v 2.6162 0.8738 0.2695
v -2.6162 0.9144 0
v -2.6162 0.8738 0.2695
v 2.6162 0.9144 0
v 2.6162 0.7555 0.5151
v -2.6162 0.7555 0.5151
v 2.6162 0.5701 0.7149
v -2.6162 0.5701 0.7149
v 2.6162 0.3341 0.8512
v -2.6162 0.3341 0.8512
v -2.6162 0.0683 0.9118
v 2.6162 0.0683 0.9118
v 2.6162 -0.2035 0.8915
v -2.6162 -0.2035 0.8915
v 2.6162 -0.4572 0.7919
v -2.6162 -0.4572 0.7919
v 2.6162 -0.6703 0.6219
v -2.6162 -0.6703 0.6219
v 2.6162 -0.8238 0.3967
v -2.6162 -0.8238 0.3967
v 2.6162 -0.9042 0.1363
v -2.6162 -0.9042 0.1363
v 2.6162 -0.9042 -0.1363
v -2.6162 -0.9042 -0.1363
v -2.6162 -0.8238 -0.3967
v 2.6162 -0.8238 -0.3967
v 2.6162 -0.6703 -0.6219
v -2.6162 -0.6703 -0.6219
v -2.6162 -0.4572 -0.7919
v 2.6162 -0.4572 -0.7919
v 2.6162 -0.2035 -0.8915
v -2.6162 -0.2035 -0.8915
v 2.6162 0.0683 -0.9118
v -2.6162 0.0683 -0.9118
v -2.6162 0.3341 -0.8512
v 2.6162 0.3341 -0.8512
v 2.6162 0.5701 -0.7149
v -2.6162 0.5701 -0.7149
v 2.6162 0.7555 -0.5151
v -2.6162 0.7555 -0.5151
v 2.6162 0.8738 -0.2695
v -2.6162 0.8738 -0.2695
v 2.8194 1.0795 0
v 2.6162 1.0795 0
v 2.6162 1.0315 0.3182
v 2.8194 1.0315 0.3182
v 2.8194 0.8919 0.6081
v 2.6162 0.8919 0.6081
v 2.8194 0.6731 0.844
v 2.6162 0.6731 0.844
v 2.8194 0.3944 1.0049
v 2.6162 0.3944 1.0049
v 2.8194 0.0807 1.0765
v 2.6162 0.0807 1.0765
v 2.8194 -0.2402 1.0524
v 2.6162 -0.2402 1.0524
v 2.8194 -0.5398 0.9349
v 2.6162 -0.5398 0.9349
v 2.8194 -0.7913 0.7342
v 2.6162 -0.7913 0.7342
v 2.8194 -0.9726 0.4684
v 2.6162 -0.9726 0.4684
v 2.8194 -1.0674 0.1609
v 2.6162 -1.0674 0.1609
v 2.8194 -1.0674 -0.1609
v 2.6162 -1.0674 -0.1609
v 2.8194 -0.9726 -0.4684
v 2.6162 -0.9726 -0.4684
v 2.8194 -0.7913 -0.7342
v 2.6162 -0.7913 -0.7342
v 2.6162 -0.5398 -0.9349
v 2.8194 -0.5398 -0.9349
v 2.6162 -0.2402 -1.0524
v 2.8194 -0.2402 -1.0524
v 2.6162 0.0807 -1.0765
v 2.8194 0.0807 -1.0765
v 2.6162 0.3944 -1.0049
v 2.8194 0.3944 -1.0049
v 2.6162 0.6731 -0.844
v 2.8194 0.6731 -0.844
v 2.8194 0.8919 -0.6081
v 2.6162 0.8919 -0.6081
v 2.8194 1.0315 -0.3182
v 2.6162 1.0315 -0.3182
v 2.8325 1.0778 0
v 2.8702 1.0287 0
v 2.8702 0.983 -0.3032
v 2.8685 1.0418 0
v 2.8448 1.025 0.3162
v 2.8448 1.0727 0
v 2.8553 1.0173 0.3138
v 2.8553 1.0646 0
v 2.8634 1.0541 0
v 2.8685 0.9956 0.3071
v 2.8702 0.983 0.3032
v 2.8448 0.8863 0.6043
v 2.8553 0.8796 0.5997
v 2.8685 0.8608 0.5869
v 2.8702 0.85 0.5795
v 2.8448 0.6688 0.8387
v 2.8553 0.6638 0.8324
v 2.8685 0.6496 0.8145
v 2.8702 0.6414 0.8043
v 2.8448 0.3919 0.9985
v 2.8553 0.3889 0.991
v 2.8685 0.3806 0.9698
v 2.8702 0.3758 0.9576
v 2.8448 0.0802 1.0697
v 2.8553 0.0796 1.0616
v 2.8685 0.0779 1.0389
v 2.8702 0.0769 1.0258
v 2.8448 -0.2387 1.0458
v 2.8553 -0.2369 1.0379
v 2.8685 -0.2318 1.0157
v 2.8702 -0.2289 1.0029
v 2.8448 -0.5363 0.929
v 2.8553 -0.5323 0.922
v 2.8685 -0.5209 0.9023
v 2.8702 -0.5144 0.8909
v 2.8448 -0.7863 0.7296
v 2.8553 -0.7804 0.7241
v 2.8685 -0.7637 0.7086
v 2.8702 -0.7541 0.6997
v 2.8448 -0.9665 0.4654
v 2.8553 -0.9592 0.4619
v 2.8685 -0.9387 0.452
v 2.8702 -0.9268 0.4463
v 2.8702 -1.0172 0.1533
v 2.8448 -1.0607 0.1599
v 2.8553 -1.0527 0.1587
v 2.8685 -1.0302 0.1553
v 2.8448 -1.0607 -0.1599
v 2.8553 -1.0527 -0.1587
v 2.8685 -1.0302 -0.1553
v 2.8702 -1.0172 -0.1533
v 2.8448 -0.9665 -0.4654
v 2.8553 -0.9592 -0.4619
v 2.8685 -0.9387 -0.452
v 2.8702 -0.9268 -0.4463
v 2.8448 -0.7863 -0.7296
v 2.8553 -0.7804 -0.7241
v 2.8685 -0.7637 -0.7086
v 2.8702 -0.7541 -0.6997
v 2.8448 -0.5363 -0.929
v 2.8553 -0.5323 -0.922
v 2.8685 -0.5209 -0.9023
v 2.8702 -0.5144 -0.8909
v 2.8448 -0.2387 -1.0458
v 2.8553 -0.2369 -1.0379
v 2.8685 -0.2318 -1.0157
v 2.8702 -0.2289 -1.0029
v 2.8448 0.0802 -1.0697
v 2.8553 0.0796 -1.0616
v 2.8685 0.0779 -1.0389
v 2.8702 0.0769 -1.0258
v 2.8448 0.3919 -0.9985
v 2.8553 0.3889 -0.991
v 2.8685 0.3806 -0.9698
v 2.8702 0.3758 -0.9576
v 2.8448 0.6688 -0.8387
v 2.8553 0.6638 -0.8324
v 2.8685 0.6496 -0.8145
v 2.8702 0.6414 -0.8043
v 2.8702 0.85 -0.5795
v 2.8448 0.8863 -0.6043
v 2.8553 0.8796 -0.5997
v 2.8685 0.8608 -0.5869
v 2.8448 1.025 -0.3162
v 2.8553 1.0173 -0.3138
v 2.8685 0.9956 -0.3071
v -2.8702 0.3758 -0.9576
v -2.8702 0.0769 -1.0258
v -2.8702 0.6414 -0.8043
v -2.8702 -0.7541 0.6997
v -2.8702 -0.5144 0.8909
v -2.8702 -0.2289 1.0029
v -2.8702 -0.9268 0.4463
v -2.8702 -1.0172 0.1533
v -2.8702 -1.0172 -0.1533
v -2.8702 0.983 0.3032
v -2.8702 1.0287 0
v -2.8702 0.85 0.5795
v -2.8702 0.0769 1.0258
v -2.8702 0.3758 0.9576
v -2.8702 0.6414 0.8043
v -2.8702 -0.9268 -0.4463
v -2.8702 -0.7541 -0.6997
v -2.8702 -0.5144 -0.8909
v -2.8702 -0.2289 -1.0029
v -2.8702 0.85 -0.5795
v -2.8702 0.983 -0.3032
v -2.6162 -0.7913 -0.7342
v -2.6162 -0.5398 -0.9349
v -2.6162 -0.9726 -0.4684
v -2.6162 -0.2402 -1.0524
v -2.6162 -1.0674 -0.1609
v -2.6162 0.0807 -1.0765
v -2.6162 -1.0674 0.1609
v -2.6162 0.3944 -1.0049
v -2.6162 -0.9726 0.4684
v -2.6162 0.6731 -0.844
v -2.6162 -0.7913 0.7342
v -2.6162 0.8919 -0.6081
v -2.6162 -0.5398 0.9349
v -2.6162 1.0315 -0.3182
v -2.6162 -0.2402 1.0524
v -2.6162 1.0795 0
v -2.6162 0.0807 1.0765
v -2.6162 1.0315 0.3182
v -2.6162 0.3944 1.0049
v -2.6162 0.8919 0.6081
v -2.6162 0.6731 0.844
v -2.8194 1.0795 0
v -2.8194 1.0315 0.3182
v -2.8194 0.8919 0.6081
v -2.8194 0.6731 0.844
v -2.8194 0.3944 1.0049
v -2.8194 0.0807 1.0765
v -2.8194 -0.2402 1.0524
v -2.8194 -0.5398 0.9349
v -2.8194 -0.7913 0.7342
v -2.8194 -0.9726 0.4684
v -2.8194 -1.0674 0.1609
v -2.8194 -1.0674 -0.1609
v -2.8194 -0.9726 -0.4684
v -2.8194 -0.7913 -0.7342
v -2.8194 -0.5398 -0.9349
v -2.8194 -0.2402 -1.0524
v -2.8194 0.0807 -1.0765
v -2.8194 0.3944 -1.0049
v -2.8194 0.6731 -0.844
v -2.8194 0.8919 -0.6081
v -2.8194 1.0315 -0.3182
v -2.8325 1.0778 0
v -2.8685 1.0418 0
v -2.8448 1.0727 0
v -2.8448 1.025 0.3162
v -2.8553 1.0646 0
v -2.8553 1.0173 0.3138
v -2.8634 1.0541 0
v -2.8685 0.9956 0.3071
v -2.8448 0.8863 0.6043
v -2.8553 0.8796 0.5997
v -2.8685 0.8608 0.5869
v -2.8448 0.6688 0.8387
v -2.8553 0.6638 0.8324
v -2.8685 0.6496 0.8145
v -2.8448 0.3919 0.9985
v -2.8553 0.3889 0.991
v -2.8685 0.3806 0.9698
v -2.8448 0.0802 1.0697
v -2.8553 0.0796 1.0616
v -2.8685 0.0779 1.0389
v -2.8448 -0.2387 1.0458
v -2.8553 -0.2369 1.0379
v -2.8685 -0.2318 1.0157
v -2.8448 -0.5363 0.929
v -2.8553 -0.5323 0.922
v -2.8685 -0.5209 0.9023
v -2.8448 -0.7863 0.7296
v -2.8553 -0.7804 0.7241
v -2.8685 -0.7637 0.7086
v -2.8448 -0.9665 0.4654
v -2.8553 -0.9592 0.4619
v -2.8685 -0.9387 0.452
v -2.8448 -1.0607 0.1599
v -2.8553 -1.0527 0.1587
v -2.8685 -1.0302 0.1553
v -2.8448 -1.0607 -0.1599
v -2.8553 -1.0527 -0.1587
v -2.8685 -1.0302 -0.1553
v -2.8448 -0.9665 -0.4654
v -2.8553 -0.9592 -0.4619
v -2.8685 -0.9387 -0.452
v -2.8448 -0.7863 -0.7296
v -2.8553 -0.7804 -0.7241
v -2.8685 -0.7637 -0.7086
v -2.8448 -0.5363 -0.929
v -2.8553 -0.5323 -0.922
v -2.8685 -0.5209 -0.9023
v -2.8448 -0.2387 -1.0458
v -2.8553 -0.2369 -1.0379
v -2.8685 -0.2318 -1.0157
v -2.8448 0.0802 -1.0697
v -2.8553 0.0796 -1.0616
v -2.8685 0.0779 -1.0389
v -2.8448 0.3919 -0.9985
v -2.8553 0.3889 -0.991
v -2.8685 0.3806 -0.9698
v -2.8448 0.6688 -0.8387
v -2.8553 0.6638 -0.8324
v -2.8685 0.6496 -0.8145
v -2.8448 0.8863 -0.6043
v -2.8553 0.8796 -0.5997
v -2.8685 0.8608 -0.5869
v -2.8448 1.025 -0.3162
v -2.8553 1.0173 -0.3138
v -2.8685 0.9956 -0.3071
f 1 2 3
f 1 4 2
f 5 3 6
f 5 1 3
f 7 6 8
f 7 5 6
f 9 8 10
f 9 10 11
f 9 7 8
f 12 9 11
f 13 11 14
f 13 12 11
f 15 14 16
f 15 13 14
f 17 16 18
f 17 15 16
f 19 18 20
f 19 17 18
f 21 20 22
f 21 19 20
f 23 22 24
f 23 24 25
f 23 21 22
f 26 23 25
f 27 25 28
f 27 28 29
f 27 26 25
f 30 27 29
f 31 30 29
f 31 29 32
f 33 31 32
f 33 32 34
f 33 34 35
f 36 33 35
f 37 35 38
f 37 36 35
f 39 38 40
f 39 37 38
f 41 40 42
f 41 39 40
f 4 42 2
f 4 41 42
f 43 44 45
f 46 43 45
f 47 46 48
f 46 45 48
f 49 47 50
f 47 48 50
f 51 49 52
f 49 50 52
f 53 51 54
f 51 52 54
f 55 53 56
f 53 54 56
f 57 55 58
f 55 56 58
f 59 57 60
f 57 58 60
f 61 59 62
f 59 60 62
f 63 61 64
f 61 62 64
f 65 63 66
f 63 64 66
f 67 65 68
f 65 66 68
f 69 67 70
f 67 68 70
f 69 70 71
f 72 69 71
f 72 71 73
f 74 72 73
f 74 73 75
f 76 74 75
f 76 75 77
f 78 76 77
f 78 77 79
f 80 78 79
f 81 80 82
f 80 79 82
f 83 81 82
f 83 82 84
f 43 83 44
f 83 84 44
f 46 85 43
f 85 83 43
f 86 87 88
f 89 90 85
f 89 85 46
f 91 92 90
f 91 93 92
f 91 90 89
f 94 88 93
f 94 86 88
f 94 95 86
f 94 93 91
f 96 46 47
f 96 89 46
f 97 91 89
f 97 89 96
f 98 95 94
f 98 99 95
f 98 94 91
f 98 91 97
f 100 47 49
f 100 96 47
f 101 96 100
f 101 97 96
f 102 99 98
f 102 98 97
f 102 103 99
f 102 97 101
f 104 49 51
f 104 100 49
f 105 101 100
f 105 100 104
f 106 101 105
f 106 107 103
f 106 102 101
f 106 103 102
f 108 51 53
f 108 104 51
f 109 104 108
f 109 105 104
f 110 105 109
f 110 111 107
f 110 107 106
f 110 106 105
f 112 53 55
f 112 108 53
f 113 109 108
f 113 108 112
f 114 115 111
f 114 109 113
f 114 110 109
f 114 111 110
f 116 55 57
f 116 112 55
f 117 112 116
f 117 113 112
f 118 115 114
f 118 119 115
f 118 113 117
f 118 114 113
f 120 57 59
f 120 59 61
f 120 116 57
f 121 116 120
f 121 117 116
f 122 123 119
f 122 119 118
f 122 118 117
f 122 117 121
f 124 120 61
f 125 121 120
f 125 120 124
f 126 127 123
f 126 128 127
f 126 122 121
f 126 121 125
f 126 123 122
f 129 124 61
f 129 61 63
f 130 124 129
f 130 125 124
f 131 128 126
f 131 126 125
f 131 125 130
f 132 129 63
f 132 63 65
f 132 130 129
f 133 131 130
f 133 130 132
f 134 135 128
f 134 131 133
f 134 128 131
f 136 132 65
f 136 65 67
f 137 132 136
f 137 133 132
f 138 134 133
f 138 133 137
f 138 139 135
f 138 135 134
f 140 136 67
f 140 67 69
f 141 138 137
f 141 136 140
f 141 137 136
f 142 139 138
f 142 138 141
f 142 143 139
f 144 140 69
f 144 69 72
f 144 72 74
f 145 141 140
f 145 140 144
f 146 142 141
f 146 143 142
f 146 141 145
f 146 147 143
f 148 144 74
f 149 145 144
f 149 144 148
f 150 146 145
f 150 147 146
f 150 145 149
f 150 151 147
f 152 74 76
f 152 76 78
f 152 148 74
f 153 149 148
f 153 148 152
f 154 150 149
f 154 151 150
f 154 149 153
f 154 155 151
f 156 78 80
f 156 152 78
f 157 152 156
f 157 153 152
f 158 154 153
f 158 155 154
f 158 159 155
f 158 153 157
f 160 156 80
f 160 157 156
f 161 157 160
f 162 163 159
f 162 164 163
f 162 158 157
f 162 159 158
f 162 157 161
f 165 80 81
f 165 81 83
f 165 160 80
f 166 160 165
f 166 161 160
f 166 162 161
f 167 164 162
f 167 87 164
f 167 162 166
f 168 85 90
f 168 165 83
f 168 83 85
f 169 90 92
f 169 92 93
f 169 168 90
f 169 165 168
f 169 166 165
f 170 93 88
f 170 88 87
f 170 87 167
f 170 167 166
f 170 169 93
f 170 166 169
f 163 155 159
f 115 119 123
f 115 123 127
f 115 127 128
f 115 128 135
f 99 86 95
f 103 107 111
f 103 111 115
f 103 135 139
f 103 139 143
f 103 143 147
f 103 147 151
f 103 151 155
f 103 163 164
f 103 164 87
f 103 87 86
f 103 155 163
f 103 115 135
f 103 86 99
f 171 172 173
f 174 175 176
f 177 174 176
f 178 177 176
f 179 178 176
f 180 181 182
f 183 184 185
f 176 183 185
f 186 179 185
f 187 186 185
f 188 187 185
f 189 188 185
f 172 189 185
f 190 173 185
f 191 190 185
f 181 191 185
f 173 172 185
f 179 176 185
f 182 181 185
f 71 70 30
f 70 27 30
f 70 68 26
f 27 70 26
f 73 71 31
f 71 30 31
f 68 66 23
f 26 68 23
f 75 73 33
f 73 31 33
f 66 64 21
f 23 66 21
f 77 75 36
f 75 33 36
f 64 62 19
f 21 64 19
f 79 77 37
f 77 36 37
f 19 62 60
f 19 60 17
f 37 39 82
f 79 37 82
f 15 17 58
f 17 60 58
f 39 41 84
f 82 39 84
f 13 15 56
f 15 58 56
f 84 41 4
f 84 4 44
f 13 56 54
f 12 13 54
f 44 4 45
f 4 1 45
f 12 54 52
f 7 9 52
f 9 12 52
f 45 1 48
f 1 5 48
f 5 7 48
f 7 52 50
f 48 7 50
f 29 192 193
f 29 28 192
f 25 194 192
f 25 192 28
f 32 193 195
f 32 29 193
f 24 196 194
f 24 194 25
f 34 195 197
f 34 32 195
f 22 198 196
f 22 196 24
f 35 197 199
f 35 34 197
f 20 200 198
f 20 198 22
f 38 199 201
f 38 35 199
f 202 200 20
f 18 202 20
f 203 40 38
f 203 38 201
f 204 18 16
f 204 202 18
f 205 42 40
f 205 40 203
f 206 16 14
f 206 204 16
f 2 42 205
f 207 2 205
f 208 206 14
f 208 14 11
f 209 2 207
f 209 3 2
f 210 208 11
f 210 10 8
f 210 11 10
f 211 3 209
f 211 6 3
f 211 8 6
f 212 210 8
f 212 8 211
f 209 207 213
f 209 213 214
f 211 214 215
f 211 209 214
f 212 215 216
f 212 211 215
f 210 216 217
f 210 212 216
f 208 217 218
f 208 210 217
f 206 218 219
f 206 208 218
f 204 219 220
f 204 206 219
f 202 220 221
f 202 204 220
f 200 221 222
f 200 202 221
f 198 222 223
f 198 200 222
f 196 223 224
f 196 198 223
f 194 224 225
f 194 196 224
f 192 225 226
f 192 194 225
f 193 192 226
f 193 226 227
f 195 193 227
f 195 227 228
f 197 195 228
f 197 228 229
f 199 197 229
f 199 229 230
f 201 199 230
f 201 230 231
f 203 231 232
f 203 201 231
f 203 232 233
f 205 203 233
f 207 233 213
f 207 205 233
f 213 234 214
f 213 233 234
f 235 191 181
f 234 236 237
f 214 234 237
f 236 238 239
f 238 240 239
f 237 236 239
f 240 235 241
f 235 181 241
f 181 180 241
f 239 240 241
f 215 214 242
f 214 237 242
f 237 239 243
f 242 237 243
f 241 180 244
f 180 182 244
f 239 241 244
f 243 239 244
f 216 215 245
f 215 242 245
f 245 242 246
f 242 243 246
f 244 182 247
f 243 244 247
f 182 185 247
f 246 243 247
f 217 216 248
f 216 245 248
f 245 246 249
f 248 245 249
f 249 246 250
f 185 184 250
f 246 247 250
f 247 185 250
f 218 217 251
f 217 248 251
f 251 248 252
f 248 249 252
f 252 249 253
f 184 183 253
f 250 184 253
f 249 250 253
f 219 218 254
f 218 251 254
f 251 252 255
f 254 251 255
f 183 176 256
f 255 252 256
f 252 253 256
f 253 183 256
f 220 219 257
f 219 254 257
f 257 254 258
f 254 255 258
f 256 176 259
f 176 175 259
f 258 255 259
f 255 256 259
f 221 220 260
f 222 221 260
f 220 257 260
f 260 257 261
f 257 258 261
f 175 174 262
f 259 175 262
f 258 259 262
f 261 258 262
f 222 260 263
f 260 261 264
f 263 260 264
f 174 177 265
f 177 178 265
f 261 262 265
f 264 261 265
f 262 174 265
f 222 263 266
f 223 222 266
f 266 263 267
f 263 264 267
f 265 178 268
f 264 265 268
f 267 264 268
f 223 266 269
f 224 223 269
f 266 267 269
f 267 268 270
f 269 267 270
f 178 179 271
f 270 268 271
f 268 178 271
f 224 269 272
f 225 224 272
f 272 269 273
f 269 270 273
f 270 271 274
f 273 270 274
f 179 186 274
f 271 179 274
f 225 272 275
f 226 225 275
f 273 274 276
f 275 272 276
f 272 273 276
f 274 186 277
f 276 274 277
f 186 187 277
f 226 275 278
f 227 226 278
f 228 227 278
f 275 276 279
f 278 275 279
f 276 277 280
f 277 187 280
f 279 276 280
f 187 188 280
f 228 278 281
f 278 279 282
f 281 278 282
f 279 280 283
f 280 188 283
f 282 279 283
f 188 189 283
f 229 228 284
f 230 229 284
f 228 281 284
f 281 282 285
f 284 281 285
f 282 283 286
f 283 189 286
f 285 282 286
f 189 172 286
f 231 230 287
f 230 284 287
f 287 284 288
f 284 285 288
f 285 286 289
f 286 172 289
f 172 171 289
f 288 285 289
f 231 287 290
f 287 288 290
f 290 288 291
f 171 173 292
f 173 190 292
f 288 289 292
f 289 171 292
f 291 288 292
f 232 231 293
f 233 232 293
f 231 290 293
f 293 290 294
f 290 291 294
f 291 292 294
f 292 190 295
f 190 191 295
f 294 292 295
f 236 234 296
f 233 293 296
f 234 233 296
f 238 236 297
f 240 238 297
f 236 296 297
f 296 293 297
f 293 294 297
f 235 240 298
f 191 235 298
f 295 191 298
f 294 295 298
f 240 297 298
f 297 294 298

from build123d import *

# Parameters (mm, degrees)
F0_R     = 0.9144
F1_DEPTH = 2.6162
F2_R     = 1.0795
F3_DEPTH = 0.254
F4_R     = 0.0508


with BuildPart() as f1:
    # F0 (on Right) → F1 (new body)
    with BuildSketch(Plane.YZ):
        Circle(F0_R)
    extrude(amount=F1_DEPTH)

    # F2 (on face) → F3 (join)
    with BuildSketch(Plane.YZ.offset(2.6162)):
        Circle(F2_R)
    extrude(amount=F3_DEPTH)

    # F4
    f4_edges = [f1.edges().sort_by_distance(p)[0] for p in [
        (2.8702, -1.0795, 0),
    ]]
    fillet(f4_edges, radius=F4_R)

    # F5: F1 across face


with BuildPart() as f1_1:
    add(f1.part)
    add(f1.part.mirror(Plane(origin=(0, 0, 0), x_dir=(0, 1, 0), z_dir=(-1, 0, 0))))


solid = f1_1.part
